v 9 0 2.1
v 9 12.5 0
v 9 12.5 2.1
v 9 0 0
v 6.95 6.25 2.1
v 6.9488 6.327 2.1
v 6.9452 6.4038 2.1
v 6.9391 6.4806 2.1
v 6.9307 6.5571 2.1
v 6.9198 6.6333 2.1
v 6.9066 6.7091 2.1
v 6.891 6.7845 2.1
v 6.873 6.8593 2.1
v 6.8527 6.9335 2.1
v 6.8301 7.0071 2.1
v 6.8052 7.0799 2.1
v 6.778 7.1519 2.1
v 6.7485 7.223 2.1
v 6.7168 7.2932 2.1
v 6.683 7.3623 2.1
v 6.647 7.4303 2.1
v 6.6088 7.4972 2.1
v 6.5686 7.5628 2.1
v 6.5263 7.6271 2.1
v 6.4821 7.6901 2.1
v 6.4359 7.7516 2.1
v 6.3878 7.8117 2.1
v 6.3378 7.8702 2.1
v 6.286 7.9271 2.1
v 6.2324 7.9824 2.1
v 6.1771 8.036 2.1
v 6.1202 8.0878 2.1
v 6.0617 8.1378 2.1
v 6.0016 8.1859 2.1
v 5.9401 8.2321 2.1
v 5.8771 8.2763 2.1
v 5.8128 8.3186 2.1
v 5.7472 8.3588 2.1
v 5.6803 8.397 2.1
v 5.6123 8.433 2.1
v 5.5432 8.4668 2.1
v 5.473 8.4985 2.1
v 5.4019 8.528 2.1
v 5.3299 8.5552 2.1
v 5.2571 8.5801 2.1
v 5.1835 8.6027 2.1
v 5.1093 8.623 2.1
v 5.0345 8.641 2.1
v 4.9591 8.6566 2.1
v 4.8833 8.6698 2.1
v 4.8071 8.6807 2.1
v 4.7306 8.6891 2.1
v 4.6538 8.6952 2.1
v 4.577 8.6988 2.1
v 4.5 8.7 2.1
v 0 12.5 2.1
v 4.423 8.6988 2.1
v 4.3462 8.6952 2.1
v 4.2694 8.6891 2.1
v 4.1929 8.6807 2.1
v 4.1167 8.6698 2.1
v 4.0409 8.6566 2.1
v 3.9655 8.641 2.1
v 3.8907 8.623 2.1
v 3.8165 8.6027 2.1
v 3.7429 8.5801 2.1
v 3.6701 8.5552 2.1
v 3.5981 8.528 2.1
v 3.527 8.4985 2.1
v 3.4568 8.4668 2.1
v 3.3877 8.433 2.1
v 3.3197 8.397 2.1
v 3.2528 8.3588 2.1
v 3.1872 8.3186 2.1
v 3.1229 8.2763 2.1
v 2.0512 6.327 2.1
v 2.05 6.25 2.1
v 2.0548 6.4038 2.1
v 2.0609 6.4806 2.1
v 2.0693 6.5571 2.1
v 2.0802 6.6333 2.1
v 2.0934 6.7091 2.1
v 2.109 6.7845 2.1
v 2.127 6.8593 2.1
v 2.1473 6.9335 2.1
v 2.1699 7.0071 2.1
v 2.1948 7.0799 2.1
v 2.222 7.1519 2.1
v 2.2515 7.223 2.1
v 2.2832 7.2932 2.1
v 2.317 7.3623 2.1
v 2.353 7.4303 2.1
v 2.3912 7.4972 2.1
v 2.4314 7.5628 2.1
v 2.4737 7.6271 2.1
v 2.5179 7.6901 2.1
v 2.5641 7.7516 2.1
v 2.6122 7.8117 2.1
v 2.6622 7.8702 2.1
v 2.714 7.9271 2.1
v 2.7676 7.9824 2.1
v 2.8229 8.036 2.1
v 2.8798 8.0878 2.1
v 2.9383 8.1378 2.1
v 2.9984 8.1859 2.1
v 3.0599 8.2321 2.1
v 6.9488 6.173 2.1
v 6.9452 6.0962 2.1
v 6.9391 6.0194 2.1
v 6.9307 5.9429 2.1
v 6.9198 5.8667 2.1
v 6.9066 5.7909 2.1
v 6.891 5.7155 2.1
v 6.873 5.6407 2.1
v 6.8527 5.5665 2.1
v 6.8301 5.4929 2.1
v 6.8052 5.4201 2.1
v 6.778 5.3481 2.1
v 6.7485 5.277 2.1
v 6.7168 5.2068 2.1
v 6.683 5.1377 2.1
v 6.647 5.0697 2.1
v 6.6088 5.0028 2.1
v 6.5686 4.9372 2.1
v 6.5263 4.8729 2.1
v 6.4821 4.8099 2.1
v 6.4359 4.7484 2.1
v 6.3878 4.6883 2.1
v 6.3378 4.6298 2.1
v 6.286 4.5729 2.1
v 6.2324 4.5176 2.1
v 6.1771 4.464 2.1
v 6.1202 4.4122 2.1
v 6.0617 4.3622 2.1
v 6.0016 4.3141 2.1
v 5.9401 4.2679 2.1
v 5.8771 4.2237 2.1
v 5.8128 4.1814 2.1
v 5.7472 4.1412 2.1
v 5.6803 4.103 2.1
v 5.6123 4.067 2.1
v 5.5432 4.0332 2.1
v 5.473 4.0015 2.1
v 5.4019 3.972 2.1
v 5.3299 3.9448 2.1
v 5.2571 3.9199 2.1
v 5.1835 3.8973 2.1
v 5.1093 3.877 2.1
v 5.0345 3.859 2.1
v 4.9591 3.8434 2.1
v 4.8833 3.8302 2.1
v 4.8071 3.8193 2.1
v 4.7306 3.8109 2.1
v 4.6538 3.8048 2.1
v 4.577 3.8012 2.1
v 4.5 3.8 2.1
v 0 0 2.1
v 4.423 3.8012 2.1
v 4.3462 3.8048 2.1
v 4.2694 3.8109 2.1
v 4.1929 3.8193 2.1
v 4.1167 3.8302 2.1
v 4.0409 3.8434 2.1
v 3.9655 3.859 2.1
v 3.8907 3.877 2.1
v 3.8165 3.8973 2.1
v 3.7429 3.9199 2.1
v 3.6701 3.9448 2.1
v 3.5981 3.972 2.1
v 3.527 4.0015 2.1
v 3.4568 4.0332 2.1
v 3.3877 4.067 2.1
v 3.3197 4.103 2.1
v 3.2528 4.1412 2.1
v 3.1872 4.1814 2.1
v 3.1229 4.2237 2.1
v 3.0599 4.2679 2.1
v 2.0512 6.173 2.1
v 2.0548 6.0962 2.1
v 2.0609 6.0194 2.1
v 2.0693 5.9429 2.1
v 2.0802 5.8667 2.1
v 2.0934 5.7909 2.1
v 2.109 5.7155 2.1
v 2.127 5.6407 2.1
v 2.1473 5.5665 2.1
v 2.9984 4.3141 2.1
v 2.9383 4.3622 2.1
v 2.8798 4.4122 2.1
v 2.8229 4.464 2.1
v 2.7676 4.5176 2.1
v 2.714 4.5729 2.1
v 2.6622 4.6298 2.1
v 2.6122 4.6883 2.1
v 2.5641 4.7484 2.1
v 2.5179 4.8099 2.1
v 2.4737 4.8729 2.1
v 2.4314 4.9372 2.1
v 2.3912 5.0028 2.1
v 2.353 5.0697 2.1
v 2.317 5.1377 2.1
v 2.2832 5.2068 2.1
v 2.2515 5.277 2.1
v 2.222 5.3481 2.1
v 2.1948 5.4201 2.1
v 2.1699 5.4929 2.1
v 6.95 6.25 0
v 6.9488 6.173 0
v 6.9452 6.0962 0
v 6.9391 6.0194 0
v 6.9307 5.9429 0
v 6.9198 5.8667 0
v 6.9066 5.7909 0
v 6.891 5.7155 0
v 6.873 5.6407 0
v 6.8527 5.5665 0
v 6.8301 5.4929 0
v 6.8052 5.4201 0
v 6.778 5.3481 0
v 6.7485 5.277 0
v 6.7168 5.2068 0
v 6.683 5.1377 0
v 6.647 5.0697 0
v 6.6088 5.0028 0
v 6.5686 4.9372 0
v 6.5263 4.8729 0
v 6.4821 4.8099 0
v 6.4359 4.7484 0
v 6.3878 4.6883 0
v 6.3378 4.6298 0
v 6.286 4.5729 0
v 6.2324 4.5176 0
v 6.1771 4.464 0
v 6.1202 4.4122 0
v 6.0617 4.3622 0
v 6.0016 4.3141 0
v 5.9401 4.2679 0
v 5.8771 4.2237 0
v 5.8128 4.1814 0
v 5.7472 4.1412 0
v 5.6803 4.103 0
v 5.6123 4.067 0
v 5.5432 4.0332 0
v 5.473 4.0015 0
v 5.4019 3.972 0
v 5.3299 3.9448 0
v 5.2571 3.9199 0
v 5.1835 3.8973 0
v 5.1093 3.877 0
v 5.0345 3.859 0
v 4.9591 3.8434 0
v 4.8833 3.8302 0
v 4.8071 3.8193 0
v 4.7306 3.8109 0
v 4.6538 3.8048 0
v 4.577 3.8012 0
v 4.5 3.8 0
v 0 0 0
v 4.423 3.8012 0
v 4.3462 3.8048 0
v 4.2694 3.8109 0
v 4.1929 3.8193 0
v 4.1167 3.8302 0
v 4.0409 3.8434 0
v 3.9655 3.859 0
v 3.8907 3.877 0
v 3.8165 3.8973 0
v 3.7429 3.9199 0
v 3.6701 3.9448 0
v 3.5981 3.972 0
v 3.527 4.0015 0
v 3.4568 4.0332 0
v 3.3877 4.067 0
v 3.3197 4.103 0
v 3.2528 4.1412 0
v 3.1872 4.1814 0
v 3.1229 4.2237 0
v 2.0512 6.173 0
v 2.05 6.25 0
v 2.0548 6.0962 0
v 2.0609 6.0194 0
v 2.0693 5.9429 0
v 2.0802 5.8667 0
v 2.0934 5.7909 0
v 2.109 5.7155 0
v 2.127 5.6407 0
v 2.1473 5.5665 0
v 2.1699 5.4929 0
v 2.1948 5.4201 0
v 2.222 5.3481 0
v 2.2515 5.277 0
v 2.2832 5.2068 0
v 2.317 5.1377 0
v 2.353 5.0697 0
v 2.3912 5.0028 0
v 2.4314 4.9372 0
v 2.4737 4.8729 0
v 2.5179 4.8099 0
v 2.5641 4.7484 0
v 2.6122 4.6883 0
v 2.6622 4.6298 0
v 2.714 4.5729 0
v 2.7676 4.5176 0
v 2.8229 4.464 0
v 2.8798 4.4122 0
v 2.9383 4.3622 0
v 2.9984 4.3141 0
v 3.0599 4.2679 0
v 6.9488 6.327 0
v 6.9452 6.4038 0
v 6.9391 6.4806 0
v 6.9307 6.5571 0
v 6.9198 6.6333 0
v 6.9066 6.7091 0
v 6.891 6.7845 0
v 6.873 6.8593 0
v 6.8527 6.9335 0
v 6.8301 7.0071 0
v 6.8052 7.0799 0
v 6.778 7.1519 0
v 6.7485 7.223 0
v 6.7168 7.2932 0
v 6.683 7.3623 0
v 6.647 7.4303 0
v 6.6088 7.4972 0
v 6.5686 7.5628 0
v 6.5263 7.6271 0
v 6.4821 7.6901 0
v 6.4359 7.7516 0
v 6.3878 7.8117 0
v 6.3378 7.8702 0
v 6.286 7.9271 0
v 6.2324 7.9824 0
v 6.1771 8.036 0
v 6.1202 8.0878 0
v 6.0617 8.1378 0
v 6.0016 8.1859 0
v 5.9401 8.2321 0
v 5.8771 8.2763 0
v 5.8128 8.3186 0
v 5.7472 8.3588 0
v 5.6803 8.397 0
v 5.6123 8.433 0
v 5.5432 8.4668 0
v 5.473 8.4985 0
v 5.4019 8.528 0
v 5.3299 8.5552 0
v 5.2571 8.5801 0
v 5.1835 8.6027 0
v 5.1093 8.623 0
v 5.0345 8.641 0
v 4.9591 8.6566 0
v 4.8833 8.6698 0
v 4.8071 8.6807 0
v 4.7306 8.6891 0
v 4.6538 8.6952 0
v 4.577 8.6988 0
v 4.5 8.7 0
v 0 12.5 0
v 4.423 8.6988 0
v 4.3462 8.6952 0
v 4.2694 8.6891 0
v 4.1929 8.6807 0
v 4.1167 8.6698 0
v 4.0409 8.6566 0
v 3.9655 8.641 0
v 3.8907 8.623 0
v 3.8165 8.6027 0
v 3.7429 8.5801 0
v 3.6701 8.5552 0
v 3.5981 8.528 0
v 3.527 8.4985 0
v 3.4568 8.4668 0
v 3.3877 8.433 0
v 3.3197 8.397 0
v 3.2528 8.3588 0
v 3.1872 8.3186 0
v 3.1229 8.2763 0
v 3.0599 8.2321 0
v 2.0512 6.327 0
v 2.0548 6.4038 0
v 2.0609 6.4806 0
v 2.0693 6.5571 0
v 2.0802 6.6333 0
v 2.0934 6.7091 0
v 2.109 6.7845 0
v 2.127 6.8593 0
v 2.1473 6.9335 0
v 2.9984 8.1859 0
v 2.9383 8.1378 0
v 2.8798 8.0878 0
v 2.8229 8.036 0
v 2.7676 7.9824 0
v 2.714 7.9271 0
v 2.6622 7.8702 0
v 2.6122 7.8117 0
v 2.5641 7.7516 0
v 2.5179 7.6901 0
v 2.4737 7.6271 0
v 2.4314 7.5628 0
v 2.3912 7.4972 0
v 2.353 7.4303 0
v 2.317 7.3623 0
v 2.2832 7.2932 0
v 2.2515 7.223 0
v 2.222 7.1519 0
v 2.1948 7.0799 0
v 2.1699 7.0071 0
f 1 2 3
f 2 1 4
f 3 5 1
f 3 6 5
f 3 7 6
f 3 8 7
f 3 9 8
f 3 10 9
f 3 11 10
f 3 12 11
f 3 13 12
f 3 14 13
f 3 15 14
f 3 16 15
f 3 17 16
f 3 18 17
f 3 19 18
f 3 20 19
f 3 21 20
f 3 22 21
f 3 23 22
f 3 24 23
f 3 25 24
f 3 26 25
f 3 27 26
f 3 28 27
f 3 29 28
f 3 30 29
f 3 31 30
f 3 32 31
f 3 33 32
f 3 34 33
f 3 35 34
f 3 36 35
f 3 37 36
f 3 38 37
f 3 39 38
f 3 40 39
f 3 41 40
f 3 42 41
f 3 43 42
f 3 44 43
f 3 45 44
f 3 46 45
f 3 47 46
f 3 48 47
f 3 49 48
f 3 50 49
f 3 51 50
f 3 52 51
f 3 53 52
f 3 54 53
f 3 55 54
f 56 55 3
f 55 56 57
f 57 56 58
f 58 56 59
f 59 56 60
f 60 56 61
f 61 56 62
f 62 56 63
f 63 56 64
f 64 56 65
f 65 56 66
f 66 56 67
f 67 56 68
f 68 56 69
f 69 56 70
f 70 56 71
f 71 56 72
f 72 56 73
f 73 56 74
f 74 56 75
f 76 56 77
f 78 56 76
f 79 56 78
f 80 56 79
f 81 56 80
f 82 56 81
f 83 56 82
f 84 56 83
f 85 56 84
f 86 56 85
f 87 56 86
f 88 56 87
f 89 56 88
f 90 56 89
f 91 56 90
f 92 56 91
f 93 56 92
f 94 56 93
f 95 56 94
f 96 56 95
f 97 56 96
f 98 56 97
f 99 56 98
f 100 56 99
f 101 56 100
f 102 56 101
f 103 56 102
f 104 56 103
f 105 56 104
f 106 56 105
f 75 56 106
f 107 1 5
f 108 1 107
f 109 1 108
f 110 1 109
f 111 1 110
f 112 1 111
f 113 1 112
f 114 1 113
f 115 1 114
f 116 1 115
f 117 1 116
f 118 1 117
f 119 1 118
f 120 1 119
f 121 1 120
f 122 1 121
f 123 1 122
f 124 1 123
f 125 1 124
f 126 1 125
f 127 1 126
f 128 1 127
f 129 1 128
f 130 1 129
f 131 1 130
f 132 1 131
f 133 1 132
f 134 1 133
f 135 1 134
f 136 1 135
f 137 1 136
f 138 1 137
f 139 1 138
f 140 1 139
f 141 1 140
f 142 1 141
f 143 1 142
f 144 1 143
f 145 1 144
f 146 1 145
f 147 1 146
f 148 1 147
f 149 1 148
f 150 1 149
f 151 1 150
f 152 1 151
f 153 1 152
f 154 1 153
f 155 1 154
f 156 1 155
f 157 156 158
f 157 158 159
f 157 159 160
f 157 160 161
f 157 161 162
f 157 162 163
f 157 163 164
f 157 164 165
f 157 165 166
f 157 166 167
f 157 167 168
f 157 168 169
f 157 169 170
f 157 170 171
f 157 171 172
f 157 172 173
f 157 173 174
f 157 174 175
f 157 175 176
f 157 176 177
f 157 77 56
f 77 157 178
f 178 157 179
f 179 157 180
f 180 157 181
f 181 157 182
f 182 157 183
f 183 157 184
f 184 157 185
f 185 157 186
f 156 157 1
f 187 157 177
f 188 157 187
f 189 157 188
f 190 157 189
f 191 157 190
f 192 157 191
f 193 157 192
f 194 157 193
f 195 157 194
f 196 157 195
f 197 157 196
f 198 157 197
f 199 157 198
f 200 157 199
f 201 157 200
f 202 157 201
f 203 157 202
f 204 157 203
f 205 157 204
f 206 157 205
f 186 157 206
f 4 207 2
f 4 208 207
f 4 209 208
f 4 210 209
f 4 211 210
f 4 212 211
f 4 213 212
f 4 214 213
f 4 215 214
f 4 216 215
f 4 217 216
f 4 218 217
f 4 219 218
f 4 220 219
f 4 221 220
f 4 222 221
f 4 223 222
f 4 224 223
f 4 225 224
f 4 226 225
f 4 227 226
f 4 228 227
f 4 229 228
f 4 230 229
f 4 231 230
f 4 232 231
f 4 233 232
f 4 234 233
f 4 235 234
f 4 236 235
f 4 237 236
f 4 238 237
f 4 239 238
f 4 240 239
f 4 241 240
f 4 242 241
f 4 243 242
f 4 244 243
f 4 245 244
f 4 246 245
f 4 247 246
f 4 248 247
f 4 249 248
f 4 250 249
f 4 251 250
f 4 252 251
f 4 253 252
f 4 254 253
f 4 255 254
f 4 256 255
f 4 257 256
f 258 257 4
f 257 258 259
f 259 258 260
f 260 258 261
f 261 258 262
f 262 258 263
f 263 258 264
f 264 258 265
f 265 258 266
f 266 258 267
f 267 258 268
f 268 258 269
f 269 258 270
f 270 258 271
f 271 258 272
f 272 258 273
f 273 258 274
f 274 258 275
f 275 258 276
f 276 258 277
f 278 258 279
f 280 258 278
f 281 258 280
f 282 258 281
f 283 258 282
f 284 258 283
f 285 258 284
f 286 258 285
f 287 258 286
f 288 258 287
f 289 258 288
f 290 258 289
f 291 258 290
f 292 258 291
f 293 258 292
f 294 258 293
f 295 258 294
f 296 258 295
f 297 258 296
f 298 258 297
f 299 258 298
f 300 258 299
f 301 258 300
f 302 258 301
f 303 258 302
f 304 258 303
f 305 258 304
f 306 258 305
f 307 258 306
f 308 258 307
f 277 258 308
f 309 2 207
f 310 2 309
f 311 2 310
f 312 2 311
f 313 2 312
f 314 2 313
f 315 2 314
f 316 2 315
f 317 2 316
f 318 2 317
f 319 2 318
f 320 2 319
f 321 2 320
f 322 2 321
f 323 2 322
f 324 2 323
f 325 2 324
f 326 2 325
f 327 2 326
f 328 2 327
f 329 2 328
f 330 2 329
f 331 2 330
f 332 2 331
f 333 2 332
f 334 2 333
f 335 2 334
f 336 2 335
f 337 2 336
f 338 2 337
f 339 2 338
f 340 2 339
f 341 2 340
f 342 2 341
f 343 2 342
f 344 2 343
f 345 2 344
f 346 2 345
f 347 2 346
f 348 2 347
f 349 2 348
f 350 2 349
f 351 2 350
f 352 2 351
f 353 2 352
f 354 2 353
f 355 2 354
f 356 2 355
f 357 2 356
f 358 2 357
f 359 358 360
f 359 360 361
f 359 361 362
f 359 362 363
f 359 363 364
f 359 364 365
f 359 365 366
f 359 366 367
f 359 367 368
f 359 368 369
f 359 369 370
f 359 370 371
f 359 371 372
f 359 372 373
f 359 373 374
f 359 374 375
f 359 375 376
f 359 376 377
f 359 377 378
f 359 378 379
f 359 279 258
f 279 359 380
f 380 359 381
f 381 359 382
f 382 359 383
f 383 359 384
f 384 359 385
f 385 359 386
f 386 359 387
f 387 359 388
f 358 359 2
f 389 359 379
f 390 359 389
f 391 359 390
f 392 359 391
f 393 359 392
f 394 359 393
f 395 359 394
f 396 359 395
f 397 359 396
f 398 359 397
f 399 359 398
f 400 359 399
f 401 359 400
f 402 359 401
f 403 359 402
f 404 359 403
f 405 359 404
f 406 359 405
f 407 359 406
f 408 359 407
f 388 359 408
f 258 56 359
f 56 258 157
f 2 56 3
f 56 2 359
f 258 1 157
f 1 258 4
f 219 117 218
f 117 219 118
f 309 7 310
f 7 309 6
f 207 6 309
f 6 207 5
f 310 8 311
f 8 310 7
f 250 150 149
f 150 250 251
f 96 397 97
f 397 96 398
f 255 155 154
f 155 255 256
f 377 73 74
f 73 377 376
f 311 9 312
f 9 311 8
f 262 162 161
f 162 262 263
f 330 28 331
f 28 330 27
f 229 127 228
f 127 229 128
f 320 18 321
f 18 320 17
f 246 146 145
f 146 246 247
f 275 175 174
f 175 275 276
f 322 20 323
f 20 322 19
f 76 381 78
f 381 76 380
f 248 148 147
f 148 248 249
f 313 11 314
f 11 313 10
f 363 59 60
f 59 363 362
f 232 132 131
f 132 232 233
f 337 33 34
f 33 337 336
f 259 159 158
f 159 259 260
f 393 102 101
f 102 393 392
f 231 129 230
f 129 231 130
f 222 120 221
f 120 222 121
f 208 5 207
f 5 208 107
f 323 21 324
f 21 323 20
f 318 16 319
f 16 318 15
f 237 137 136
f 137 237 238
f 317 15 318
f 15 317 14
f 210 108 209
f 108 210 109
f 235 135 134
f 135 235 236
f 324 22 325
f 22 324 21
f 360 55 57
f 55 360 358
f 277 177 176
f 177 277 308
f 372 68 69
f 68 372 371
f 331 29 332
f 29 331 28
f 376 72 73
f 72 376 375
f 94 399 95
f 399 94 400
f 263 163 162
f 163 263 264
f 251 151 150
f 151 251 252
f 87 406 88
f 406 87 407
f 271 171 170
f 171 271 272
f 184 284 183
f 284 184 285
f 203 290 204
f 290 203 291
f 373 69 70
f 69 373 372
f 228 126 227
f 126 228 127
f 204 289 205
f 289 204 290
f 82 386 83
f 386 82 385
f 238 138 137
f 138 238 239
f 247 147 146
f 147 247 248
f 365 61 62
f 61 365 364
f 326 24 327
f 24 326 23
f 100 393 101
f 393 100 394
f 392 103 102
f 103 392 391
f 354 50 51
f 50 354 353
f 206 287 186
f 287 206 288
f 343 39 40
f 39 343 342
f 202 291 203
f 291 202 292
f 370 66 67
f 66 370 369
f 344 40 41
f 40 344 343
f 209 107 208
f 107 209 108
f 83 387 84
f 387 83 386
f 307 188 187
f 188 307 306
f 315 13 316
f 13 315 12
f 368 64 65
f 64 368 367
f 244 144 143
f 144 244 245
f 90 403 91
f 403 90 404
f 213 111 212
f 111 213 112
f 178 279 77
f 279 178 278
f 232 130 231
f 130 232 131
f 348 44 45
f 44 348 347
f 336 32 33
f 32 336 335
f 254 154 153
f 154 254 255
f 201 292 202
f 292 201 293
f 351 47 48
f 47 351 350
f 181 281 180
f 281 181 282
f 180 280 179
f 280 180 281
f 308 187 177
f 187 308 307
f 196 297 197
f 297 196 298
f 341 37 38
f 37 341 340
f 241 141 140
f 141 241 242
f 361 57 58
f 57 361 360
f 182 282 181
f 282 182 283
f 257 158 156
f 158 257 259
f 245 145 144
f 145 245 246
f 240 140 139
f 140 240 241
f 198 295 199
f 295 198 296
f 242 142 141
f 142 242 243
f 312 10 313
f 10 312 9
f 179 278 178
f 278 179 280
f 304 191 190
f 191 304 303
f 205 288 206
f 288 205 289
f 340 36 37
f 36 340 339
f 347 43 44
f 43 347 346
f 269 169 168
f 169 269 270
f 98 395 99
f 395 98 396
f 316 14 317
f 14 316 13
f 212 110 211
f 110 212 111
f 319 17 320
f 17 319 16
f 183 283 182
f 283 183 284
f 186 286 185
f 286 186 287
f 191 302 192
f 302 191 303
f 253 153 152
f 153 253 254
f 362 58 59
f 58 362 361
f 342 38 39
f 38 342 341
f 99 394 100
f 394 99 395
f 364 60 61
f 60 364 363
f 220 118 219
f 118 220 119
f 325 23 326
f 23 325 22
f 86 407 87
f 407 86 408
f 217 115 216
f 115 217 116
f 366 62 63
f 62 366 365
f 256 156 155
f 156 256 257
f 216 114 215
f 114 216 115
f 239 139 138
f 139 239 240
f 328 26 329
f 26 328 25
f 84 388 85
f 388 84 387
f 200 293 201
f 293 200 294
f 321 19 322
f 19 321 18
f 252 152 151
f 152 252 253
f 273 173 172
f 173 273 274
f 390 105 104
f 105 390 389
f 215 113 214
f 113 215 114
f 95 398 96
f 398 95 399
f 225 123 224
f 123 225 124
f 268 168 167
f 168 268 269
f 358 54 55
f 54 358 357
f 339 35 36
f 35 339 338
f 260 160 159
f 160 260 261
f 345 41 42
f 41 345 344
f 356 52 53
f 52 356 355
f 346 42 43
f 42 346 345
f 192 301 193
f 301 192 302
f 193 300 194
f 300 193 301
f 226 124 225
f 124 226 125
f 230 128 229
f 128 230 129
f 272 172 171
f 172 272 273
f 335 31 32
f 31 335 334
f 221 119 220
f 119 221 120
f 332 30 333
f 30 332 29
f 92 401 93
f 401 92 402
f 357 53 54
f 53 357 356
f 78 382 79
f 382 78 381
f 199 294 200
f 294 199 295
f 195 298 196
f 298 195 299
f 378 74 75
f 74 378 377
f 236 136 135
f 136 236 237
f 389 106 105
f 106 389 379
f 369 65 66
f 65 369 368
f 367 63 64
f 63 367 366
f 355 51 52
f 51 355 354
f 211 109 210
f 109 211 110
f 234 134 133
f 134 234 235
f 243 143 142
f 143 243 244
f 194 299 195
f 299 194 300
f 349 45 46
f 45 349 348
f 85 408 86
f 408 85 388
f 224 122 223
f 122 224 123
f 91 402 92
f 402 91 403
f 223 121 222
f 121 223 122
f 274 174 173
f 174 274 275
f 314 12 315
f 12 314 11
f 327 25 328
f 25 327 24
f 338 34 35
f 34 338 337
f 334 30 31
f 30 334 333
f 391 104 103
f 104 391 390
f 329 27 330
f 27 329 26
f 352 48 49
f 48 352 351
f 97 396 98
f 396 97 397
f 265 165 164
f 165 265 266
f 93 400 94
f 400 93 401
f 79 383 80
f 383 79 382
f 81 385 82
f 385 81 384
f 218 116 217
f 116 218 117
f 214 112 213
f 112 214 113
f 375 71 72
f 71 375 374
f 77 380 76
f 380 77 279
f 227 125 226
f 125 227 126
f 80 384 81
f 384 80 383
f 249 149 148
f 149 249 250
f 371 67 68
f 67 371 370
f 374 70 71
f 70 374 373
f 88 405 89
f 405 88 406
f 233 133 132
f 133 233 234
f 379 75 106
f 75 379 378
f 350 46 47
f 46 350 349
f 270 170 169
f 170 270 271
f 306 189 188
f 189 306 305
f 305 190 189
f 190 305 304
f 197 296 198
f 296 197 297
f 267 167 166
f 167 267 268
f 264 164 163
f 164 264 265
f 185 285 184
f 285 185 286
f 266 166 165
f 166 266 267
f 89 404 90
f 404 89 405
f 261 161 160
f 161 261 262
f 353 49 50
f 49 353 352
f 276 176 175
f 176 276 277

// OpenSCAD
insert_height = 2.10;
insert_width = 9.00;
screw_diameter=  5.00;

//
// this is a makerslide t-nut insert that expects to be fitted with a brass
// thread insert that melts nicely into a 5mm hole (by default)
//
module insert(h=insert_height, w=insert_width, d=screw_diameter, $fn=200)
{
    l = d * 2.5;
    difference()
    {
        cube([w, l, h]);
        translate([w/2, l/2, -0.1])
        cylinder(d=d-0.1, h=h+0.2);
    }
}

insert();
